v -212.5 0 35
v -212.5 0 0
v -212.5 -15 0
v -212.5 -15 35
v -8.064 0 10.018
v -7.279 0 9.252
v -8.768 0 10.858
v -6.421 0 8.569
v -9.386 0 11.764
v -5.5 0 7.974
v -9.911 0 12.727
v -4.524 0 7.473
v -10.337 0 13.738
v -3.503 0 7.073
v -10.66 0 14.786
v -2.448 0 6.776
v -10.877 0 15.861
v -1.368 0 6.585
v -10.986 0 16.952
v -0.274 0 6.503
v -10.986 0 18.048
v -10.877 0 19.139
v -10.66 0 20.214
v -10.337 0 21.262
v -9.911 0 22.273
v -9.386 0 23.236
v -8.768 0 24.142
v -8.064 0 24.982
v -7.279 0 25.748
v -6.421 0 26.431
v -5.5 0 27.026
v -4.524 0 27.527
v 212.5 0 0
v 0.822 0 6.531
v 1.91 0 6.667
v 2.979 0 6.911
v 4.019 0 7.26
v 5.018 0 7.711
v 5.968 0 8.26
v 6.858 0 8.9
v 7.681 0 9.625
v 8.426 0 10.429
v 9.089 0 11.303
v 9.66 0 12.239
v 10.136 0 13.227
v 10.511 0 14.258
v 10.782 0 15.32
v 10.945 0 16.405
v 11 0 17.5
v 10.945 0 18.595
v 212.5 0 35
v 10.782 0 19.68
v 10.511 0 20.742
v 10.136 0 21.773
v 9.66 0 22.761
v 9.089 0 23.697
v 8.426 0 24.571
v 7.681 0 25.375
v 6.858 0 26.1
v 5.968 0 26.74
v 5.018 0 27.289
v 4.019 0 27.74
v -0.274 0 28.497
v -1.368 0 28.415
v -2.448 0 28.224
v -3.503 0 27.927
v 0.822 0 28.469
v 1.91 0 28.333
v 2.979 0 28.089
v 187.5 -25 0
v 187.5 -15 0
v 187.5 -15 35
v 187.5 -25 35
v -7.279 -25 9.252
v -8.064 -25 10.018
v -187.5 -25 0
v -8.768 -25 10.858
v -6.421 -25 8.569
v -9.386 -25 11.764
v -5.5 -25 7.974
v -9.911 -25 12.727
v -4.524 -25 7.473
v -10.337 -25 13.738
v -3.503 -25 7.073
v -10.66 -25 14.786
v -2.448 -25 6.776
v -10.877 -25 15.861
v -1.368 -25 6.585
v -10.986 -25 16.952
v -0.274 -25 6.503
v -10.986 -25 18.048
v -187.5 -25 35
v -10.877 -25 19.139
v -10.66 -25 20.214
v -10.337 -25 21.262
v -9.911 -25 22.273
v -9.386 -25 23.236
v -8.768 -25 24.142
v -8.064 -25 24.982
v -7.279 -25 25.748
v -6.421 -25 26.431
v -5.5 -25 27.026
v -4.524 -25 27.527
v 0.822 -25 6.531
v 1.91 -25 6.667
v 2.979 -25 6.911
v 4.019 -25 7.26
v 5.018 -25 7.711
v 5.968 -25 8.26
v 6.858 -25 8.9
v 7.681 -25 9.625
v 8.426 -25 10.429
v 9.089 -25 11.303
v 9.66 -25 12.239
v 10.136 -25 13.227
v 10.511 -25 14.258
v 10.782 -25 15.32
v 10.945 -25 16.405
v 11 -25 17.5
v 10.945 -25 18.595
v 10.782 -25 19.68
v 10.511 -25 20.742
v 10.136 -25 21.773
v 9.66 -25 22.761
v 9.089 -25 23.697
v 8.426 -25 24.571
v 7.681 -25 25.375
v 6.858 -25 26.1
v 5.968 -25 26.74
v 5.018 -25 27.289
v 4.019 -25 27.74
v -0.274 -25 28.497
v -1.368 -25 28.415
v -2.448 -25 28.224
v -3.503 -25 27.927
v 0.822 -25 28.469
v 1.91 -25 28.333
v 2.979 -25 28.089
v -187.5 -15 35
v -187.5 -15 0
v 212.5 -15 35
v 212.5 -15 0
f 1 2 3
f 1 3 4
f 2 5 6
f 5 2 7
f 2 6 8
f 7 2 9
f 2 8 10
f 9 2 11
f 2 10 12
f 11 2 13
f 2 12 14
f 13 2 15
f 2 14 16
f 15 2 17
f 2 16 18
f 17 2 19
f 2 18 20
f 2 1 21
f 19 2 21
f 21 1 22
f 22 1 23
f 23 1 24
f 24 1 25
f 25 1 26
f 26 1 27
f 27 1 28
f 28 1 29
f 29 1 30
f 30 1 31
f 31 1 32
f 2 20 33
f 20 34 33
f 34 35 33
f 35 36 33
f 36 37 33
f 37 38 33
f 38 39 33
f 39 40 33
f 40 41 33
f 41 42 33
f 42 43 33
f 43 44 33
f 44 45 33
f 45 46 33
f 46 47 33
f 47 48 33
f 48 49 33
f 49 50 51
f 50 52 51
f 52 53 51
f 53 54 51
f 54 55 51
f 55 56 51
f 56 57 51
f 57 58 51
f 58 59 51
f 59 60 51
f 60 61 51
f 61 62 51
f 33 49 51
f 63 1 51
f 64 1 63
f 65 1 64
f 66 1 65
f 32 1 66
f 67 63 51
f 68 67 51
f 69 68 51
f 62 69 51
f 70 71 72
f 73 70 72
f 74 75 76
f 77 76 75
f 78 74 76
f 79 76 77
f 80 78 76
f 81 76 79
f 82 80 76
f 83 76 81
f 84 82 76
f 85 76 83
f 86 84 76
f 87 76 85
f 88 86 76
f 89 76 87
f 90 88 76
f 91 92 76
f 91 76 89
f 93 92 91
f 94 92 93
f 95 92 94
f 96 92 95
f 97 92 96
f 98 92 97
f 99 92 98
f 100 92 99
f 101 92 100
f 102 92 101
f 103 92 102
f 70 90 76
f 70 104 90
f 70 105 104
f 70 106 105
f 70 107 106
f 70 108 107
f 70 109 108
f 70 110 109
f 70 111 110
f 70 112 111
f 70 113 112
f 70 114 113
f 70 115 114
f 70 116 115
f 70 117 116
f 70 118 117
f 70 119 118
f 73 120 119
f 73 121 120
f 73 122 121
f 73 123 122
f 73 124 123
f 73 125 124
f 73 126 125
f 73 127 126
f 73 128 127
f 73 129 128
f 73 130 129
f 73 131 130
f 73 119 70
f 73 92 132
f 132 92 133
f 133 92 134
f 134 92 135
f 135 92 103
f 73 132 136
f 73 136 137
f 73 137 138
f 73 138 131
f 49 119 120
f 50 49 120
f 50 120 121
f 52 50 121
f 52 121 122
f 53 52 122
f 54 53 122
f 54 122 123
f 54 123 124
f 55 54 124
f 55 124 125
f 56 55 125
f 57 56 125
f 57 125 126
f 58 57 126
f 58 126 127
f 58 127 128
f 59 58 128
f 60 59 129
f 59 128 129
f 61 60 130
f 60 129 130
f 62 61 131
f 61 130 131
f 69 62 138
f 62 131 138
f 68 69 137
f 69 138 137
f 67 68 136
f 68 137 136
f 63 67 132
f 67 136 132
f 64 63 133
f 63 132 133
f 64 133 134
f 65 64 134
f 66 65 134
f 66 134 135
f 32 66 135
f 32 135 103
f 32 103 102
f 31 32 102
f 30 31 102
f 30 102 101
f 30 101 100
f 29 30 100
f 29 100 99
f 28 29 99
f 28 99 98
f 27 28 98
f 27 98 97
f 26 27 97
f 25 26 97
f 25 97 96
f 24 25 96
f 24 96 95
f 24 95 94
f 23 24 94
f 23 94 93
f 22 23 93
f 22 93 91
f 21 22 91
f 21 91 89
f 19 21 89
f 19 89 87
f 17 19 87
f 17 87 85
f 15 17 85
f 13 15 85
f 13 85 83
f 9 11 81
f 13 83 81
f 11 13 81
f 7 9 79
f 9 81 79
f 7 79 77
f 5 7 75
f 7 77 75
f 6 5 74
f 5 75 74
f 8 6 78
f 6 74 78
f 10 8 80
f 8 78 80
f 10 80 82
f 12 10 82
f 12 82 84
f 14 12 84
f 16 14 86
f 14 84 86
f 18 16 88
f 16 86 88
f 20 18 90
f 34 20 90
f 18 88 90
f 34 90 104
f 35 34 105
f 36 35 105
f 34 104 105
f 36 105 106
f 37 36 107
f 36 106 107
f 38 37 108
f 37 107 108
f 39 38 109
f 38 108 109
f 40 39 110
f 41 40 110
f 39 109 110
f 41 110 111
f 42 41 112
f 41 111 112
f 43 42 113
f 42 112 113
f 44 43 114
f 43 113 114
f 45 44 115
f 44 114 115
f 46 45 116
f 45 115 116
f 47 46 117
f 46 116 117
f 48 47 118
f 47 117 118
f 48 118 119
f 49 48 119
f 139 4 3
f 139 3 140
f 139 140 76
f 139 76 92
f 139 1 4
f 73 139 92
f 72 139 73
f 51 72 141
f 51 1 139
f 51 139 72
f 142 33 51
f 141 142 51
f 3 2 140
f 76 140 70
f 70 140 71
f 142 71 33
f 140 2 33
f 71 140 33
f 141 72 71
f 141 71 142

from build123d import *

# Parameters (mm, degrees)
F0_W     = 425
F0_H     = 35
F1_DEPTH = 15
F2_W     = 375
F2_H     = 35
F3_DEPTH = 10
F5_D     = 22


with BuildPart() as f1:
    # F0 (on Front) → F1 (new body)
    with BuildSketch(Plane.XZ):
        with Locations((0, 17.5)):
            Rectangle(F0_W, F0_H)
    extrude(amount=F1_DEPTH)

    # F2 (on face) → F3 (join)
    with BuildSketch(Plane.XZ.offset(15)):
        with Locations((0, 17.5)):
            Rectangle(F2_W, F2_H)
    extrude(amount=F3_DEPTH)

    # F5 (through all)
    with Locations(Plane(origin=(0, 0, 0), x_dir=(-1, 0, 0), z_dir=(0, 1, 0))):
        with Locations((0, 17.5)):
            Hole(F5_D / 2)


solid = f1.part
